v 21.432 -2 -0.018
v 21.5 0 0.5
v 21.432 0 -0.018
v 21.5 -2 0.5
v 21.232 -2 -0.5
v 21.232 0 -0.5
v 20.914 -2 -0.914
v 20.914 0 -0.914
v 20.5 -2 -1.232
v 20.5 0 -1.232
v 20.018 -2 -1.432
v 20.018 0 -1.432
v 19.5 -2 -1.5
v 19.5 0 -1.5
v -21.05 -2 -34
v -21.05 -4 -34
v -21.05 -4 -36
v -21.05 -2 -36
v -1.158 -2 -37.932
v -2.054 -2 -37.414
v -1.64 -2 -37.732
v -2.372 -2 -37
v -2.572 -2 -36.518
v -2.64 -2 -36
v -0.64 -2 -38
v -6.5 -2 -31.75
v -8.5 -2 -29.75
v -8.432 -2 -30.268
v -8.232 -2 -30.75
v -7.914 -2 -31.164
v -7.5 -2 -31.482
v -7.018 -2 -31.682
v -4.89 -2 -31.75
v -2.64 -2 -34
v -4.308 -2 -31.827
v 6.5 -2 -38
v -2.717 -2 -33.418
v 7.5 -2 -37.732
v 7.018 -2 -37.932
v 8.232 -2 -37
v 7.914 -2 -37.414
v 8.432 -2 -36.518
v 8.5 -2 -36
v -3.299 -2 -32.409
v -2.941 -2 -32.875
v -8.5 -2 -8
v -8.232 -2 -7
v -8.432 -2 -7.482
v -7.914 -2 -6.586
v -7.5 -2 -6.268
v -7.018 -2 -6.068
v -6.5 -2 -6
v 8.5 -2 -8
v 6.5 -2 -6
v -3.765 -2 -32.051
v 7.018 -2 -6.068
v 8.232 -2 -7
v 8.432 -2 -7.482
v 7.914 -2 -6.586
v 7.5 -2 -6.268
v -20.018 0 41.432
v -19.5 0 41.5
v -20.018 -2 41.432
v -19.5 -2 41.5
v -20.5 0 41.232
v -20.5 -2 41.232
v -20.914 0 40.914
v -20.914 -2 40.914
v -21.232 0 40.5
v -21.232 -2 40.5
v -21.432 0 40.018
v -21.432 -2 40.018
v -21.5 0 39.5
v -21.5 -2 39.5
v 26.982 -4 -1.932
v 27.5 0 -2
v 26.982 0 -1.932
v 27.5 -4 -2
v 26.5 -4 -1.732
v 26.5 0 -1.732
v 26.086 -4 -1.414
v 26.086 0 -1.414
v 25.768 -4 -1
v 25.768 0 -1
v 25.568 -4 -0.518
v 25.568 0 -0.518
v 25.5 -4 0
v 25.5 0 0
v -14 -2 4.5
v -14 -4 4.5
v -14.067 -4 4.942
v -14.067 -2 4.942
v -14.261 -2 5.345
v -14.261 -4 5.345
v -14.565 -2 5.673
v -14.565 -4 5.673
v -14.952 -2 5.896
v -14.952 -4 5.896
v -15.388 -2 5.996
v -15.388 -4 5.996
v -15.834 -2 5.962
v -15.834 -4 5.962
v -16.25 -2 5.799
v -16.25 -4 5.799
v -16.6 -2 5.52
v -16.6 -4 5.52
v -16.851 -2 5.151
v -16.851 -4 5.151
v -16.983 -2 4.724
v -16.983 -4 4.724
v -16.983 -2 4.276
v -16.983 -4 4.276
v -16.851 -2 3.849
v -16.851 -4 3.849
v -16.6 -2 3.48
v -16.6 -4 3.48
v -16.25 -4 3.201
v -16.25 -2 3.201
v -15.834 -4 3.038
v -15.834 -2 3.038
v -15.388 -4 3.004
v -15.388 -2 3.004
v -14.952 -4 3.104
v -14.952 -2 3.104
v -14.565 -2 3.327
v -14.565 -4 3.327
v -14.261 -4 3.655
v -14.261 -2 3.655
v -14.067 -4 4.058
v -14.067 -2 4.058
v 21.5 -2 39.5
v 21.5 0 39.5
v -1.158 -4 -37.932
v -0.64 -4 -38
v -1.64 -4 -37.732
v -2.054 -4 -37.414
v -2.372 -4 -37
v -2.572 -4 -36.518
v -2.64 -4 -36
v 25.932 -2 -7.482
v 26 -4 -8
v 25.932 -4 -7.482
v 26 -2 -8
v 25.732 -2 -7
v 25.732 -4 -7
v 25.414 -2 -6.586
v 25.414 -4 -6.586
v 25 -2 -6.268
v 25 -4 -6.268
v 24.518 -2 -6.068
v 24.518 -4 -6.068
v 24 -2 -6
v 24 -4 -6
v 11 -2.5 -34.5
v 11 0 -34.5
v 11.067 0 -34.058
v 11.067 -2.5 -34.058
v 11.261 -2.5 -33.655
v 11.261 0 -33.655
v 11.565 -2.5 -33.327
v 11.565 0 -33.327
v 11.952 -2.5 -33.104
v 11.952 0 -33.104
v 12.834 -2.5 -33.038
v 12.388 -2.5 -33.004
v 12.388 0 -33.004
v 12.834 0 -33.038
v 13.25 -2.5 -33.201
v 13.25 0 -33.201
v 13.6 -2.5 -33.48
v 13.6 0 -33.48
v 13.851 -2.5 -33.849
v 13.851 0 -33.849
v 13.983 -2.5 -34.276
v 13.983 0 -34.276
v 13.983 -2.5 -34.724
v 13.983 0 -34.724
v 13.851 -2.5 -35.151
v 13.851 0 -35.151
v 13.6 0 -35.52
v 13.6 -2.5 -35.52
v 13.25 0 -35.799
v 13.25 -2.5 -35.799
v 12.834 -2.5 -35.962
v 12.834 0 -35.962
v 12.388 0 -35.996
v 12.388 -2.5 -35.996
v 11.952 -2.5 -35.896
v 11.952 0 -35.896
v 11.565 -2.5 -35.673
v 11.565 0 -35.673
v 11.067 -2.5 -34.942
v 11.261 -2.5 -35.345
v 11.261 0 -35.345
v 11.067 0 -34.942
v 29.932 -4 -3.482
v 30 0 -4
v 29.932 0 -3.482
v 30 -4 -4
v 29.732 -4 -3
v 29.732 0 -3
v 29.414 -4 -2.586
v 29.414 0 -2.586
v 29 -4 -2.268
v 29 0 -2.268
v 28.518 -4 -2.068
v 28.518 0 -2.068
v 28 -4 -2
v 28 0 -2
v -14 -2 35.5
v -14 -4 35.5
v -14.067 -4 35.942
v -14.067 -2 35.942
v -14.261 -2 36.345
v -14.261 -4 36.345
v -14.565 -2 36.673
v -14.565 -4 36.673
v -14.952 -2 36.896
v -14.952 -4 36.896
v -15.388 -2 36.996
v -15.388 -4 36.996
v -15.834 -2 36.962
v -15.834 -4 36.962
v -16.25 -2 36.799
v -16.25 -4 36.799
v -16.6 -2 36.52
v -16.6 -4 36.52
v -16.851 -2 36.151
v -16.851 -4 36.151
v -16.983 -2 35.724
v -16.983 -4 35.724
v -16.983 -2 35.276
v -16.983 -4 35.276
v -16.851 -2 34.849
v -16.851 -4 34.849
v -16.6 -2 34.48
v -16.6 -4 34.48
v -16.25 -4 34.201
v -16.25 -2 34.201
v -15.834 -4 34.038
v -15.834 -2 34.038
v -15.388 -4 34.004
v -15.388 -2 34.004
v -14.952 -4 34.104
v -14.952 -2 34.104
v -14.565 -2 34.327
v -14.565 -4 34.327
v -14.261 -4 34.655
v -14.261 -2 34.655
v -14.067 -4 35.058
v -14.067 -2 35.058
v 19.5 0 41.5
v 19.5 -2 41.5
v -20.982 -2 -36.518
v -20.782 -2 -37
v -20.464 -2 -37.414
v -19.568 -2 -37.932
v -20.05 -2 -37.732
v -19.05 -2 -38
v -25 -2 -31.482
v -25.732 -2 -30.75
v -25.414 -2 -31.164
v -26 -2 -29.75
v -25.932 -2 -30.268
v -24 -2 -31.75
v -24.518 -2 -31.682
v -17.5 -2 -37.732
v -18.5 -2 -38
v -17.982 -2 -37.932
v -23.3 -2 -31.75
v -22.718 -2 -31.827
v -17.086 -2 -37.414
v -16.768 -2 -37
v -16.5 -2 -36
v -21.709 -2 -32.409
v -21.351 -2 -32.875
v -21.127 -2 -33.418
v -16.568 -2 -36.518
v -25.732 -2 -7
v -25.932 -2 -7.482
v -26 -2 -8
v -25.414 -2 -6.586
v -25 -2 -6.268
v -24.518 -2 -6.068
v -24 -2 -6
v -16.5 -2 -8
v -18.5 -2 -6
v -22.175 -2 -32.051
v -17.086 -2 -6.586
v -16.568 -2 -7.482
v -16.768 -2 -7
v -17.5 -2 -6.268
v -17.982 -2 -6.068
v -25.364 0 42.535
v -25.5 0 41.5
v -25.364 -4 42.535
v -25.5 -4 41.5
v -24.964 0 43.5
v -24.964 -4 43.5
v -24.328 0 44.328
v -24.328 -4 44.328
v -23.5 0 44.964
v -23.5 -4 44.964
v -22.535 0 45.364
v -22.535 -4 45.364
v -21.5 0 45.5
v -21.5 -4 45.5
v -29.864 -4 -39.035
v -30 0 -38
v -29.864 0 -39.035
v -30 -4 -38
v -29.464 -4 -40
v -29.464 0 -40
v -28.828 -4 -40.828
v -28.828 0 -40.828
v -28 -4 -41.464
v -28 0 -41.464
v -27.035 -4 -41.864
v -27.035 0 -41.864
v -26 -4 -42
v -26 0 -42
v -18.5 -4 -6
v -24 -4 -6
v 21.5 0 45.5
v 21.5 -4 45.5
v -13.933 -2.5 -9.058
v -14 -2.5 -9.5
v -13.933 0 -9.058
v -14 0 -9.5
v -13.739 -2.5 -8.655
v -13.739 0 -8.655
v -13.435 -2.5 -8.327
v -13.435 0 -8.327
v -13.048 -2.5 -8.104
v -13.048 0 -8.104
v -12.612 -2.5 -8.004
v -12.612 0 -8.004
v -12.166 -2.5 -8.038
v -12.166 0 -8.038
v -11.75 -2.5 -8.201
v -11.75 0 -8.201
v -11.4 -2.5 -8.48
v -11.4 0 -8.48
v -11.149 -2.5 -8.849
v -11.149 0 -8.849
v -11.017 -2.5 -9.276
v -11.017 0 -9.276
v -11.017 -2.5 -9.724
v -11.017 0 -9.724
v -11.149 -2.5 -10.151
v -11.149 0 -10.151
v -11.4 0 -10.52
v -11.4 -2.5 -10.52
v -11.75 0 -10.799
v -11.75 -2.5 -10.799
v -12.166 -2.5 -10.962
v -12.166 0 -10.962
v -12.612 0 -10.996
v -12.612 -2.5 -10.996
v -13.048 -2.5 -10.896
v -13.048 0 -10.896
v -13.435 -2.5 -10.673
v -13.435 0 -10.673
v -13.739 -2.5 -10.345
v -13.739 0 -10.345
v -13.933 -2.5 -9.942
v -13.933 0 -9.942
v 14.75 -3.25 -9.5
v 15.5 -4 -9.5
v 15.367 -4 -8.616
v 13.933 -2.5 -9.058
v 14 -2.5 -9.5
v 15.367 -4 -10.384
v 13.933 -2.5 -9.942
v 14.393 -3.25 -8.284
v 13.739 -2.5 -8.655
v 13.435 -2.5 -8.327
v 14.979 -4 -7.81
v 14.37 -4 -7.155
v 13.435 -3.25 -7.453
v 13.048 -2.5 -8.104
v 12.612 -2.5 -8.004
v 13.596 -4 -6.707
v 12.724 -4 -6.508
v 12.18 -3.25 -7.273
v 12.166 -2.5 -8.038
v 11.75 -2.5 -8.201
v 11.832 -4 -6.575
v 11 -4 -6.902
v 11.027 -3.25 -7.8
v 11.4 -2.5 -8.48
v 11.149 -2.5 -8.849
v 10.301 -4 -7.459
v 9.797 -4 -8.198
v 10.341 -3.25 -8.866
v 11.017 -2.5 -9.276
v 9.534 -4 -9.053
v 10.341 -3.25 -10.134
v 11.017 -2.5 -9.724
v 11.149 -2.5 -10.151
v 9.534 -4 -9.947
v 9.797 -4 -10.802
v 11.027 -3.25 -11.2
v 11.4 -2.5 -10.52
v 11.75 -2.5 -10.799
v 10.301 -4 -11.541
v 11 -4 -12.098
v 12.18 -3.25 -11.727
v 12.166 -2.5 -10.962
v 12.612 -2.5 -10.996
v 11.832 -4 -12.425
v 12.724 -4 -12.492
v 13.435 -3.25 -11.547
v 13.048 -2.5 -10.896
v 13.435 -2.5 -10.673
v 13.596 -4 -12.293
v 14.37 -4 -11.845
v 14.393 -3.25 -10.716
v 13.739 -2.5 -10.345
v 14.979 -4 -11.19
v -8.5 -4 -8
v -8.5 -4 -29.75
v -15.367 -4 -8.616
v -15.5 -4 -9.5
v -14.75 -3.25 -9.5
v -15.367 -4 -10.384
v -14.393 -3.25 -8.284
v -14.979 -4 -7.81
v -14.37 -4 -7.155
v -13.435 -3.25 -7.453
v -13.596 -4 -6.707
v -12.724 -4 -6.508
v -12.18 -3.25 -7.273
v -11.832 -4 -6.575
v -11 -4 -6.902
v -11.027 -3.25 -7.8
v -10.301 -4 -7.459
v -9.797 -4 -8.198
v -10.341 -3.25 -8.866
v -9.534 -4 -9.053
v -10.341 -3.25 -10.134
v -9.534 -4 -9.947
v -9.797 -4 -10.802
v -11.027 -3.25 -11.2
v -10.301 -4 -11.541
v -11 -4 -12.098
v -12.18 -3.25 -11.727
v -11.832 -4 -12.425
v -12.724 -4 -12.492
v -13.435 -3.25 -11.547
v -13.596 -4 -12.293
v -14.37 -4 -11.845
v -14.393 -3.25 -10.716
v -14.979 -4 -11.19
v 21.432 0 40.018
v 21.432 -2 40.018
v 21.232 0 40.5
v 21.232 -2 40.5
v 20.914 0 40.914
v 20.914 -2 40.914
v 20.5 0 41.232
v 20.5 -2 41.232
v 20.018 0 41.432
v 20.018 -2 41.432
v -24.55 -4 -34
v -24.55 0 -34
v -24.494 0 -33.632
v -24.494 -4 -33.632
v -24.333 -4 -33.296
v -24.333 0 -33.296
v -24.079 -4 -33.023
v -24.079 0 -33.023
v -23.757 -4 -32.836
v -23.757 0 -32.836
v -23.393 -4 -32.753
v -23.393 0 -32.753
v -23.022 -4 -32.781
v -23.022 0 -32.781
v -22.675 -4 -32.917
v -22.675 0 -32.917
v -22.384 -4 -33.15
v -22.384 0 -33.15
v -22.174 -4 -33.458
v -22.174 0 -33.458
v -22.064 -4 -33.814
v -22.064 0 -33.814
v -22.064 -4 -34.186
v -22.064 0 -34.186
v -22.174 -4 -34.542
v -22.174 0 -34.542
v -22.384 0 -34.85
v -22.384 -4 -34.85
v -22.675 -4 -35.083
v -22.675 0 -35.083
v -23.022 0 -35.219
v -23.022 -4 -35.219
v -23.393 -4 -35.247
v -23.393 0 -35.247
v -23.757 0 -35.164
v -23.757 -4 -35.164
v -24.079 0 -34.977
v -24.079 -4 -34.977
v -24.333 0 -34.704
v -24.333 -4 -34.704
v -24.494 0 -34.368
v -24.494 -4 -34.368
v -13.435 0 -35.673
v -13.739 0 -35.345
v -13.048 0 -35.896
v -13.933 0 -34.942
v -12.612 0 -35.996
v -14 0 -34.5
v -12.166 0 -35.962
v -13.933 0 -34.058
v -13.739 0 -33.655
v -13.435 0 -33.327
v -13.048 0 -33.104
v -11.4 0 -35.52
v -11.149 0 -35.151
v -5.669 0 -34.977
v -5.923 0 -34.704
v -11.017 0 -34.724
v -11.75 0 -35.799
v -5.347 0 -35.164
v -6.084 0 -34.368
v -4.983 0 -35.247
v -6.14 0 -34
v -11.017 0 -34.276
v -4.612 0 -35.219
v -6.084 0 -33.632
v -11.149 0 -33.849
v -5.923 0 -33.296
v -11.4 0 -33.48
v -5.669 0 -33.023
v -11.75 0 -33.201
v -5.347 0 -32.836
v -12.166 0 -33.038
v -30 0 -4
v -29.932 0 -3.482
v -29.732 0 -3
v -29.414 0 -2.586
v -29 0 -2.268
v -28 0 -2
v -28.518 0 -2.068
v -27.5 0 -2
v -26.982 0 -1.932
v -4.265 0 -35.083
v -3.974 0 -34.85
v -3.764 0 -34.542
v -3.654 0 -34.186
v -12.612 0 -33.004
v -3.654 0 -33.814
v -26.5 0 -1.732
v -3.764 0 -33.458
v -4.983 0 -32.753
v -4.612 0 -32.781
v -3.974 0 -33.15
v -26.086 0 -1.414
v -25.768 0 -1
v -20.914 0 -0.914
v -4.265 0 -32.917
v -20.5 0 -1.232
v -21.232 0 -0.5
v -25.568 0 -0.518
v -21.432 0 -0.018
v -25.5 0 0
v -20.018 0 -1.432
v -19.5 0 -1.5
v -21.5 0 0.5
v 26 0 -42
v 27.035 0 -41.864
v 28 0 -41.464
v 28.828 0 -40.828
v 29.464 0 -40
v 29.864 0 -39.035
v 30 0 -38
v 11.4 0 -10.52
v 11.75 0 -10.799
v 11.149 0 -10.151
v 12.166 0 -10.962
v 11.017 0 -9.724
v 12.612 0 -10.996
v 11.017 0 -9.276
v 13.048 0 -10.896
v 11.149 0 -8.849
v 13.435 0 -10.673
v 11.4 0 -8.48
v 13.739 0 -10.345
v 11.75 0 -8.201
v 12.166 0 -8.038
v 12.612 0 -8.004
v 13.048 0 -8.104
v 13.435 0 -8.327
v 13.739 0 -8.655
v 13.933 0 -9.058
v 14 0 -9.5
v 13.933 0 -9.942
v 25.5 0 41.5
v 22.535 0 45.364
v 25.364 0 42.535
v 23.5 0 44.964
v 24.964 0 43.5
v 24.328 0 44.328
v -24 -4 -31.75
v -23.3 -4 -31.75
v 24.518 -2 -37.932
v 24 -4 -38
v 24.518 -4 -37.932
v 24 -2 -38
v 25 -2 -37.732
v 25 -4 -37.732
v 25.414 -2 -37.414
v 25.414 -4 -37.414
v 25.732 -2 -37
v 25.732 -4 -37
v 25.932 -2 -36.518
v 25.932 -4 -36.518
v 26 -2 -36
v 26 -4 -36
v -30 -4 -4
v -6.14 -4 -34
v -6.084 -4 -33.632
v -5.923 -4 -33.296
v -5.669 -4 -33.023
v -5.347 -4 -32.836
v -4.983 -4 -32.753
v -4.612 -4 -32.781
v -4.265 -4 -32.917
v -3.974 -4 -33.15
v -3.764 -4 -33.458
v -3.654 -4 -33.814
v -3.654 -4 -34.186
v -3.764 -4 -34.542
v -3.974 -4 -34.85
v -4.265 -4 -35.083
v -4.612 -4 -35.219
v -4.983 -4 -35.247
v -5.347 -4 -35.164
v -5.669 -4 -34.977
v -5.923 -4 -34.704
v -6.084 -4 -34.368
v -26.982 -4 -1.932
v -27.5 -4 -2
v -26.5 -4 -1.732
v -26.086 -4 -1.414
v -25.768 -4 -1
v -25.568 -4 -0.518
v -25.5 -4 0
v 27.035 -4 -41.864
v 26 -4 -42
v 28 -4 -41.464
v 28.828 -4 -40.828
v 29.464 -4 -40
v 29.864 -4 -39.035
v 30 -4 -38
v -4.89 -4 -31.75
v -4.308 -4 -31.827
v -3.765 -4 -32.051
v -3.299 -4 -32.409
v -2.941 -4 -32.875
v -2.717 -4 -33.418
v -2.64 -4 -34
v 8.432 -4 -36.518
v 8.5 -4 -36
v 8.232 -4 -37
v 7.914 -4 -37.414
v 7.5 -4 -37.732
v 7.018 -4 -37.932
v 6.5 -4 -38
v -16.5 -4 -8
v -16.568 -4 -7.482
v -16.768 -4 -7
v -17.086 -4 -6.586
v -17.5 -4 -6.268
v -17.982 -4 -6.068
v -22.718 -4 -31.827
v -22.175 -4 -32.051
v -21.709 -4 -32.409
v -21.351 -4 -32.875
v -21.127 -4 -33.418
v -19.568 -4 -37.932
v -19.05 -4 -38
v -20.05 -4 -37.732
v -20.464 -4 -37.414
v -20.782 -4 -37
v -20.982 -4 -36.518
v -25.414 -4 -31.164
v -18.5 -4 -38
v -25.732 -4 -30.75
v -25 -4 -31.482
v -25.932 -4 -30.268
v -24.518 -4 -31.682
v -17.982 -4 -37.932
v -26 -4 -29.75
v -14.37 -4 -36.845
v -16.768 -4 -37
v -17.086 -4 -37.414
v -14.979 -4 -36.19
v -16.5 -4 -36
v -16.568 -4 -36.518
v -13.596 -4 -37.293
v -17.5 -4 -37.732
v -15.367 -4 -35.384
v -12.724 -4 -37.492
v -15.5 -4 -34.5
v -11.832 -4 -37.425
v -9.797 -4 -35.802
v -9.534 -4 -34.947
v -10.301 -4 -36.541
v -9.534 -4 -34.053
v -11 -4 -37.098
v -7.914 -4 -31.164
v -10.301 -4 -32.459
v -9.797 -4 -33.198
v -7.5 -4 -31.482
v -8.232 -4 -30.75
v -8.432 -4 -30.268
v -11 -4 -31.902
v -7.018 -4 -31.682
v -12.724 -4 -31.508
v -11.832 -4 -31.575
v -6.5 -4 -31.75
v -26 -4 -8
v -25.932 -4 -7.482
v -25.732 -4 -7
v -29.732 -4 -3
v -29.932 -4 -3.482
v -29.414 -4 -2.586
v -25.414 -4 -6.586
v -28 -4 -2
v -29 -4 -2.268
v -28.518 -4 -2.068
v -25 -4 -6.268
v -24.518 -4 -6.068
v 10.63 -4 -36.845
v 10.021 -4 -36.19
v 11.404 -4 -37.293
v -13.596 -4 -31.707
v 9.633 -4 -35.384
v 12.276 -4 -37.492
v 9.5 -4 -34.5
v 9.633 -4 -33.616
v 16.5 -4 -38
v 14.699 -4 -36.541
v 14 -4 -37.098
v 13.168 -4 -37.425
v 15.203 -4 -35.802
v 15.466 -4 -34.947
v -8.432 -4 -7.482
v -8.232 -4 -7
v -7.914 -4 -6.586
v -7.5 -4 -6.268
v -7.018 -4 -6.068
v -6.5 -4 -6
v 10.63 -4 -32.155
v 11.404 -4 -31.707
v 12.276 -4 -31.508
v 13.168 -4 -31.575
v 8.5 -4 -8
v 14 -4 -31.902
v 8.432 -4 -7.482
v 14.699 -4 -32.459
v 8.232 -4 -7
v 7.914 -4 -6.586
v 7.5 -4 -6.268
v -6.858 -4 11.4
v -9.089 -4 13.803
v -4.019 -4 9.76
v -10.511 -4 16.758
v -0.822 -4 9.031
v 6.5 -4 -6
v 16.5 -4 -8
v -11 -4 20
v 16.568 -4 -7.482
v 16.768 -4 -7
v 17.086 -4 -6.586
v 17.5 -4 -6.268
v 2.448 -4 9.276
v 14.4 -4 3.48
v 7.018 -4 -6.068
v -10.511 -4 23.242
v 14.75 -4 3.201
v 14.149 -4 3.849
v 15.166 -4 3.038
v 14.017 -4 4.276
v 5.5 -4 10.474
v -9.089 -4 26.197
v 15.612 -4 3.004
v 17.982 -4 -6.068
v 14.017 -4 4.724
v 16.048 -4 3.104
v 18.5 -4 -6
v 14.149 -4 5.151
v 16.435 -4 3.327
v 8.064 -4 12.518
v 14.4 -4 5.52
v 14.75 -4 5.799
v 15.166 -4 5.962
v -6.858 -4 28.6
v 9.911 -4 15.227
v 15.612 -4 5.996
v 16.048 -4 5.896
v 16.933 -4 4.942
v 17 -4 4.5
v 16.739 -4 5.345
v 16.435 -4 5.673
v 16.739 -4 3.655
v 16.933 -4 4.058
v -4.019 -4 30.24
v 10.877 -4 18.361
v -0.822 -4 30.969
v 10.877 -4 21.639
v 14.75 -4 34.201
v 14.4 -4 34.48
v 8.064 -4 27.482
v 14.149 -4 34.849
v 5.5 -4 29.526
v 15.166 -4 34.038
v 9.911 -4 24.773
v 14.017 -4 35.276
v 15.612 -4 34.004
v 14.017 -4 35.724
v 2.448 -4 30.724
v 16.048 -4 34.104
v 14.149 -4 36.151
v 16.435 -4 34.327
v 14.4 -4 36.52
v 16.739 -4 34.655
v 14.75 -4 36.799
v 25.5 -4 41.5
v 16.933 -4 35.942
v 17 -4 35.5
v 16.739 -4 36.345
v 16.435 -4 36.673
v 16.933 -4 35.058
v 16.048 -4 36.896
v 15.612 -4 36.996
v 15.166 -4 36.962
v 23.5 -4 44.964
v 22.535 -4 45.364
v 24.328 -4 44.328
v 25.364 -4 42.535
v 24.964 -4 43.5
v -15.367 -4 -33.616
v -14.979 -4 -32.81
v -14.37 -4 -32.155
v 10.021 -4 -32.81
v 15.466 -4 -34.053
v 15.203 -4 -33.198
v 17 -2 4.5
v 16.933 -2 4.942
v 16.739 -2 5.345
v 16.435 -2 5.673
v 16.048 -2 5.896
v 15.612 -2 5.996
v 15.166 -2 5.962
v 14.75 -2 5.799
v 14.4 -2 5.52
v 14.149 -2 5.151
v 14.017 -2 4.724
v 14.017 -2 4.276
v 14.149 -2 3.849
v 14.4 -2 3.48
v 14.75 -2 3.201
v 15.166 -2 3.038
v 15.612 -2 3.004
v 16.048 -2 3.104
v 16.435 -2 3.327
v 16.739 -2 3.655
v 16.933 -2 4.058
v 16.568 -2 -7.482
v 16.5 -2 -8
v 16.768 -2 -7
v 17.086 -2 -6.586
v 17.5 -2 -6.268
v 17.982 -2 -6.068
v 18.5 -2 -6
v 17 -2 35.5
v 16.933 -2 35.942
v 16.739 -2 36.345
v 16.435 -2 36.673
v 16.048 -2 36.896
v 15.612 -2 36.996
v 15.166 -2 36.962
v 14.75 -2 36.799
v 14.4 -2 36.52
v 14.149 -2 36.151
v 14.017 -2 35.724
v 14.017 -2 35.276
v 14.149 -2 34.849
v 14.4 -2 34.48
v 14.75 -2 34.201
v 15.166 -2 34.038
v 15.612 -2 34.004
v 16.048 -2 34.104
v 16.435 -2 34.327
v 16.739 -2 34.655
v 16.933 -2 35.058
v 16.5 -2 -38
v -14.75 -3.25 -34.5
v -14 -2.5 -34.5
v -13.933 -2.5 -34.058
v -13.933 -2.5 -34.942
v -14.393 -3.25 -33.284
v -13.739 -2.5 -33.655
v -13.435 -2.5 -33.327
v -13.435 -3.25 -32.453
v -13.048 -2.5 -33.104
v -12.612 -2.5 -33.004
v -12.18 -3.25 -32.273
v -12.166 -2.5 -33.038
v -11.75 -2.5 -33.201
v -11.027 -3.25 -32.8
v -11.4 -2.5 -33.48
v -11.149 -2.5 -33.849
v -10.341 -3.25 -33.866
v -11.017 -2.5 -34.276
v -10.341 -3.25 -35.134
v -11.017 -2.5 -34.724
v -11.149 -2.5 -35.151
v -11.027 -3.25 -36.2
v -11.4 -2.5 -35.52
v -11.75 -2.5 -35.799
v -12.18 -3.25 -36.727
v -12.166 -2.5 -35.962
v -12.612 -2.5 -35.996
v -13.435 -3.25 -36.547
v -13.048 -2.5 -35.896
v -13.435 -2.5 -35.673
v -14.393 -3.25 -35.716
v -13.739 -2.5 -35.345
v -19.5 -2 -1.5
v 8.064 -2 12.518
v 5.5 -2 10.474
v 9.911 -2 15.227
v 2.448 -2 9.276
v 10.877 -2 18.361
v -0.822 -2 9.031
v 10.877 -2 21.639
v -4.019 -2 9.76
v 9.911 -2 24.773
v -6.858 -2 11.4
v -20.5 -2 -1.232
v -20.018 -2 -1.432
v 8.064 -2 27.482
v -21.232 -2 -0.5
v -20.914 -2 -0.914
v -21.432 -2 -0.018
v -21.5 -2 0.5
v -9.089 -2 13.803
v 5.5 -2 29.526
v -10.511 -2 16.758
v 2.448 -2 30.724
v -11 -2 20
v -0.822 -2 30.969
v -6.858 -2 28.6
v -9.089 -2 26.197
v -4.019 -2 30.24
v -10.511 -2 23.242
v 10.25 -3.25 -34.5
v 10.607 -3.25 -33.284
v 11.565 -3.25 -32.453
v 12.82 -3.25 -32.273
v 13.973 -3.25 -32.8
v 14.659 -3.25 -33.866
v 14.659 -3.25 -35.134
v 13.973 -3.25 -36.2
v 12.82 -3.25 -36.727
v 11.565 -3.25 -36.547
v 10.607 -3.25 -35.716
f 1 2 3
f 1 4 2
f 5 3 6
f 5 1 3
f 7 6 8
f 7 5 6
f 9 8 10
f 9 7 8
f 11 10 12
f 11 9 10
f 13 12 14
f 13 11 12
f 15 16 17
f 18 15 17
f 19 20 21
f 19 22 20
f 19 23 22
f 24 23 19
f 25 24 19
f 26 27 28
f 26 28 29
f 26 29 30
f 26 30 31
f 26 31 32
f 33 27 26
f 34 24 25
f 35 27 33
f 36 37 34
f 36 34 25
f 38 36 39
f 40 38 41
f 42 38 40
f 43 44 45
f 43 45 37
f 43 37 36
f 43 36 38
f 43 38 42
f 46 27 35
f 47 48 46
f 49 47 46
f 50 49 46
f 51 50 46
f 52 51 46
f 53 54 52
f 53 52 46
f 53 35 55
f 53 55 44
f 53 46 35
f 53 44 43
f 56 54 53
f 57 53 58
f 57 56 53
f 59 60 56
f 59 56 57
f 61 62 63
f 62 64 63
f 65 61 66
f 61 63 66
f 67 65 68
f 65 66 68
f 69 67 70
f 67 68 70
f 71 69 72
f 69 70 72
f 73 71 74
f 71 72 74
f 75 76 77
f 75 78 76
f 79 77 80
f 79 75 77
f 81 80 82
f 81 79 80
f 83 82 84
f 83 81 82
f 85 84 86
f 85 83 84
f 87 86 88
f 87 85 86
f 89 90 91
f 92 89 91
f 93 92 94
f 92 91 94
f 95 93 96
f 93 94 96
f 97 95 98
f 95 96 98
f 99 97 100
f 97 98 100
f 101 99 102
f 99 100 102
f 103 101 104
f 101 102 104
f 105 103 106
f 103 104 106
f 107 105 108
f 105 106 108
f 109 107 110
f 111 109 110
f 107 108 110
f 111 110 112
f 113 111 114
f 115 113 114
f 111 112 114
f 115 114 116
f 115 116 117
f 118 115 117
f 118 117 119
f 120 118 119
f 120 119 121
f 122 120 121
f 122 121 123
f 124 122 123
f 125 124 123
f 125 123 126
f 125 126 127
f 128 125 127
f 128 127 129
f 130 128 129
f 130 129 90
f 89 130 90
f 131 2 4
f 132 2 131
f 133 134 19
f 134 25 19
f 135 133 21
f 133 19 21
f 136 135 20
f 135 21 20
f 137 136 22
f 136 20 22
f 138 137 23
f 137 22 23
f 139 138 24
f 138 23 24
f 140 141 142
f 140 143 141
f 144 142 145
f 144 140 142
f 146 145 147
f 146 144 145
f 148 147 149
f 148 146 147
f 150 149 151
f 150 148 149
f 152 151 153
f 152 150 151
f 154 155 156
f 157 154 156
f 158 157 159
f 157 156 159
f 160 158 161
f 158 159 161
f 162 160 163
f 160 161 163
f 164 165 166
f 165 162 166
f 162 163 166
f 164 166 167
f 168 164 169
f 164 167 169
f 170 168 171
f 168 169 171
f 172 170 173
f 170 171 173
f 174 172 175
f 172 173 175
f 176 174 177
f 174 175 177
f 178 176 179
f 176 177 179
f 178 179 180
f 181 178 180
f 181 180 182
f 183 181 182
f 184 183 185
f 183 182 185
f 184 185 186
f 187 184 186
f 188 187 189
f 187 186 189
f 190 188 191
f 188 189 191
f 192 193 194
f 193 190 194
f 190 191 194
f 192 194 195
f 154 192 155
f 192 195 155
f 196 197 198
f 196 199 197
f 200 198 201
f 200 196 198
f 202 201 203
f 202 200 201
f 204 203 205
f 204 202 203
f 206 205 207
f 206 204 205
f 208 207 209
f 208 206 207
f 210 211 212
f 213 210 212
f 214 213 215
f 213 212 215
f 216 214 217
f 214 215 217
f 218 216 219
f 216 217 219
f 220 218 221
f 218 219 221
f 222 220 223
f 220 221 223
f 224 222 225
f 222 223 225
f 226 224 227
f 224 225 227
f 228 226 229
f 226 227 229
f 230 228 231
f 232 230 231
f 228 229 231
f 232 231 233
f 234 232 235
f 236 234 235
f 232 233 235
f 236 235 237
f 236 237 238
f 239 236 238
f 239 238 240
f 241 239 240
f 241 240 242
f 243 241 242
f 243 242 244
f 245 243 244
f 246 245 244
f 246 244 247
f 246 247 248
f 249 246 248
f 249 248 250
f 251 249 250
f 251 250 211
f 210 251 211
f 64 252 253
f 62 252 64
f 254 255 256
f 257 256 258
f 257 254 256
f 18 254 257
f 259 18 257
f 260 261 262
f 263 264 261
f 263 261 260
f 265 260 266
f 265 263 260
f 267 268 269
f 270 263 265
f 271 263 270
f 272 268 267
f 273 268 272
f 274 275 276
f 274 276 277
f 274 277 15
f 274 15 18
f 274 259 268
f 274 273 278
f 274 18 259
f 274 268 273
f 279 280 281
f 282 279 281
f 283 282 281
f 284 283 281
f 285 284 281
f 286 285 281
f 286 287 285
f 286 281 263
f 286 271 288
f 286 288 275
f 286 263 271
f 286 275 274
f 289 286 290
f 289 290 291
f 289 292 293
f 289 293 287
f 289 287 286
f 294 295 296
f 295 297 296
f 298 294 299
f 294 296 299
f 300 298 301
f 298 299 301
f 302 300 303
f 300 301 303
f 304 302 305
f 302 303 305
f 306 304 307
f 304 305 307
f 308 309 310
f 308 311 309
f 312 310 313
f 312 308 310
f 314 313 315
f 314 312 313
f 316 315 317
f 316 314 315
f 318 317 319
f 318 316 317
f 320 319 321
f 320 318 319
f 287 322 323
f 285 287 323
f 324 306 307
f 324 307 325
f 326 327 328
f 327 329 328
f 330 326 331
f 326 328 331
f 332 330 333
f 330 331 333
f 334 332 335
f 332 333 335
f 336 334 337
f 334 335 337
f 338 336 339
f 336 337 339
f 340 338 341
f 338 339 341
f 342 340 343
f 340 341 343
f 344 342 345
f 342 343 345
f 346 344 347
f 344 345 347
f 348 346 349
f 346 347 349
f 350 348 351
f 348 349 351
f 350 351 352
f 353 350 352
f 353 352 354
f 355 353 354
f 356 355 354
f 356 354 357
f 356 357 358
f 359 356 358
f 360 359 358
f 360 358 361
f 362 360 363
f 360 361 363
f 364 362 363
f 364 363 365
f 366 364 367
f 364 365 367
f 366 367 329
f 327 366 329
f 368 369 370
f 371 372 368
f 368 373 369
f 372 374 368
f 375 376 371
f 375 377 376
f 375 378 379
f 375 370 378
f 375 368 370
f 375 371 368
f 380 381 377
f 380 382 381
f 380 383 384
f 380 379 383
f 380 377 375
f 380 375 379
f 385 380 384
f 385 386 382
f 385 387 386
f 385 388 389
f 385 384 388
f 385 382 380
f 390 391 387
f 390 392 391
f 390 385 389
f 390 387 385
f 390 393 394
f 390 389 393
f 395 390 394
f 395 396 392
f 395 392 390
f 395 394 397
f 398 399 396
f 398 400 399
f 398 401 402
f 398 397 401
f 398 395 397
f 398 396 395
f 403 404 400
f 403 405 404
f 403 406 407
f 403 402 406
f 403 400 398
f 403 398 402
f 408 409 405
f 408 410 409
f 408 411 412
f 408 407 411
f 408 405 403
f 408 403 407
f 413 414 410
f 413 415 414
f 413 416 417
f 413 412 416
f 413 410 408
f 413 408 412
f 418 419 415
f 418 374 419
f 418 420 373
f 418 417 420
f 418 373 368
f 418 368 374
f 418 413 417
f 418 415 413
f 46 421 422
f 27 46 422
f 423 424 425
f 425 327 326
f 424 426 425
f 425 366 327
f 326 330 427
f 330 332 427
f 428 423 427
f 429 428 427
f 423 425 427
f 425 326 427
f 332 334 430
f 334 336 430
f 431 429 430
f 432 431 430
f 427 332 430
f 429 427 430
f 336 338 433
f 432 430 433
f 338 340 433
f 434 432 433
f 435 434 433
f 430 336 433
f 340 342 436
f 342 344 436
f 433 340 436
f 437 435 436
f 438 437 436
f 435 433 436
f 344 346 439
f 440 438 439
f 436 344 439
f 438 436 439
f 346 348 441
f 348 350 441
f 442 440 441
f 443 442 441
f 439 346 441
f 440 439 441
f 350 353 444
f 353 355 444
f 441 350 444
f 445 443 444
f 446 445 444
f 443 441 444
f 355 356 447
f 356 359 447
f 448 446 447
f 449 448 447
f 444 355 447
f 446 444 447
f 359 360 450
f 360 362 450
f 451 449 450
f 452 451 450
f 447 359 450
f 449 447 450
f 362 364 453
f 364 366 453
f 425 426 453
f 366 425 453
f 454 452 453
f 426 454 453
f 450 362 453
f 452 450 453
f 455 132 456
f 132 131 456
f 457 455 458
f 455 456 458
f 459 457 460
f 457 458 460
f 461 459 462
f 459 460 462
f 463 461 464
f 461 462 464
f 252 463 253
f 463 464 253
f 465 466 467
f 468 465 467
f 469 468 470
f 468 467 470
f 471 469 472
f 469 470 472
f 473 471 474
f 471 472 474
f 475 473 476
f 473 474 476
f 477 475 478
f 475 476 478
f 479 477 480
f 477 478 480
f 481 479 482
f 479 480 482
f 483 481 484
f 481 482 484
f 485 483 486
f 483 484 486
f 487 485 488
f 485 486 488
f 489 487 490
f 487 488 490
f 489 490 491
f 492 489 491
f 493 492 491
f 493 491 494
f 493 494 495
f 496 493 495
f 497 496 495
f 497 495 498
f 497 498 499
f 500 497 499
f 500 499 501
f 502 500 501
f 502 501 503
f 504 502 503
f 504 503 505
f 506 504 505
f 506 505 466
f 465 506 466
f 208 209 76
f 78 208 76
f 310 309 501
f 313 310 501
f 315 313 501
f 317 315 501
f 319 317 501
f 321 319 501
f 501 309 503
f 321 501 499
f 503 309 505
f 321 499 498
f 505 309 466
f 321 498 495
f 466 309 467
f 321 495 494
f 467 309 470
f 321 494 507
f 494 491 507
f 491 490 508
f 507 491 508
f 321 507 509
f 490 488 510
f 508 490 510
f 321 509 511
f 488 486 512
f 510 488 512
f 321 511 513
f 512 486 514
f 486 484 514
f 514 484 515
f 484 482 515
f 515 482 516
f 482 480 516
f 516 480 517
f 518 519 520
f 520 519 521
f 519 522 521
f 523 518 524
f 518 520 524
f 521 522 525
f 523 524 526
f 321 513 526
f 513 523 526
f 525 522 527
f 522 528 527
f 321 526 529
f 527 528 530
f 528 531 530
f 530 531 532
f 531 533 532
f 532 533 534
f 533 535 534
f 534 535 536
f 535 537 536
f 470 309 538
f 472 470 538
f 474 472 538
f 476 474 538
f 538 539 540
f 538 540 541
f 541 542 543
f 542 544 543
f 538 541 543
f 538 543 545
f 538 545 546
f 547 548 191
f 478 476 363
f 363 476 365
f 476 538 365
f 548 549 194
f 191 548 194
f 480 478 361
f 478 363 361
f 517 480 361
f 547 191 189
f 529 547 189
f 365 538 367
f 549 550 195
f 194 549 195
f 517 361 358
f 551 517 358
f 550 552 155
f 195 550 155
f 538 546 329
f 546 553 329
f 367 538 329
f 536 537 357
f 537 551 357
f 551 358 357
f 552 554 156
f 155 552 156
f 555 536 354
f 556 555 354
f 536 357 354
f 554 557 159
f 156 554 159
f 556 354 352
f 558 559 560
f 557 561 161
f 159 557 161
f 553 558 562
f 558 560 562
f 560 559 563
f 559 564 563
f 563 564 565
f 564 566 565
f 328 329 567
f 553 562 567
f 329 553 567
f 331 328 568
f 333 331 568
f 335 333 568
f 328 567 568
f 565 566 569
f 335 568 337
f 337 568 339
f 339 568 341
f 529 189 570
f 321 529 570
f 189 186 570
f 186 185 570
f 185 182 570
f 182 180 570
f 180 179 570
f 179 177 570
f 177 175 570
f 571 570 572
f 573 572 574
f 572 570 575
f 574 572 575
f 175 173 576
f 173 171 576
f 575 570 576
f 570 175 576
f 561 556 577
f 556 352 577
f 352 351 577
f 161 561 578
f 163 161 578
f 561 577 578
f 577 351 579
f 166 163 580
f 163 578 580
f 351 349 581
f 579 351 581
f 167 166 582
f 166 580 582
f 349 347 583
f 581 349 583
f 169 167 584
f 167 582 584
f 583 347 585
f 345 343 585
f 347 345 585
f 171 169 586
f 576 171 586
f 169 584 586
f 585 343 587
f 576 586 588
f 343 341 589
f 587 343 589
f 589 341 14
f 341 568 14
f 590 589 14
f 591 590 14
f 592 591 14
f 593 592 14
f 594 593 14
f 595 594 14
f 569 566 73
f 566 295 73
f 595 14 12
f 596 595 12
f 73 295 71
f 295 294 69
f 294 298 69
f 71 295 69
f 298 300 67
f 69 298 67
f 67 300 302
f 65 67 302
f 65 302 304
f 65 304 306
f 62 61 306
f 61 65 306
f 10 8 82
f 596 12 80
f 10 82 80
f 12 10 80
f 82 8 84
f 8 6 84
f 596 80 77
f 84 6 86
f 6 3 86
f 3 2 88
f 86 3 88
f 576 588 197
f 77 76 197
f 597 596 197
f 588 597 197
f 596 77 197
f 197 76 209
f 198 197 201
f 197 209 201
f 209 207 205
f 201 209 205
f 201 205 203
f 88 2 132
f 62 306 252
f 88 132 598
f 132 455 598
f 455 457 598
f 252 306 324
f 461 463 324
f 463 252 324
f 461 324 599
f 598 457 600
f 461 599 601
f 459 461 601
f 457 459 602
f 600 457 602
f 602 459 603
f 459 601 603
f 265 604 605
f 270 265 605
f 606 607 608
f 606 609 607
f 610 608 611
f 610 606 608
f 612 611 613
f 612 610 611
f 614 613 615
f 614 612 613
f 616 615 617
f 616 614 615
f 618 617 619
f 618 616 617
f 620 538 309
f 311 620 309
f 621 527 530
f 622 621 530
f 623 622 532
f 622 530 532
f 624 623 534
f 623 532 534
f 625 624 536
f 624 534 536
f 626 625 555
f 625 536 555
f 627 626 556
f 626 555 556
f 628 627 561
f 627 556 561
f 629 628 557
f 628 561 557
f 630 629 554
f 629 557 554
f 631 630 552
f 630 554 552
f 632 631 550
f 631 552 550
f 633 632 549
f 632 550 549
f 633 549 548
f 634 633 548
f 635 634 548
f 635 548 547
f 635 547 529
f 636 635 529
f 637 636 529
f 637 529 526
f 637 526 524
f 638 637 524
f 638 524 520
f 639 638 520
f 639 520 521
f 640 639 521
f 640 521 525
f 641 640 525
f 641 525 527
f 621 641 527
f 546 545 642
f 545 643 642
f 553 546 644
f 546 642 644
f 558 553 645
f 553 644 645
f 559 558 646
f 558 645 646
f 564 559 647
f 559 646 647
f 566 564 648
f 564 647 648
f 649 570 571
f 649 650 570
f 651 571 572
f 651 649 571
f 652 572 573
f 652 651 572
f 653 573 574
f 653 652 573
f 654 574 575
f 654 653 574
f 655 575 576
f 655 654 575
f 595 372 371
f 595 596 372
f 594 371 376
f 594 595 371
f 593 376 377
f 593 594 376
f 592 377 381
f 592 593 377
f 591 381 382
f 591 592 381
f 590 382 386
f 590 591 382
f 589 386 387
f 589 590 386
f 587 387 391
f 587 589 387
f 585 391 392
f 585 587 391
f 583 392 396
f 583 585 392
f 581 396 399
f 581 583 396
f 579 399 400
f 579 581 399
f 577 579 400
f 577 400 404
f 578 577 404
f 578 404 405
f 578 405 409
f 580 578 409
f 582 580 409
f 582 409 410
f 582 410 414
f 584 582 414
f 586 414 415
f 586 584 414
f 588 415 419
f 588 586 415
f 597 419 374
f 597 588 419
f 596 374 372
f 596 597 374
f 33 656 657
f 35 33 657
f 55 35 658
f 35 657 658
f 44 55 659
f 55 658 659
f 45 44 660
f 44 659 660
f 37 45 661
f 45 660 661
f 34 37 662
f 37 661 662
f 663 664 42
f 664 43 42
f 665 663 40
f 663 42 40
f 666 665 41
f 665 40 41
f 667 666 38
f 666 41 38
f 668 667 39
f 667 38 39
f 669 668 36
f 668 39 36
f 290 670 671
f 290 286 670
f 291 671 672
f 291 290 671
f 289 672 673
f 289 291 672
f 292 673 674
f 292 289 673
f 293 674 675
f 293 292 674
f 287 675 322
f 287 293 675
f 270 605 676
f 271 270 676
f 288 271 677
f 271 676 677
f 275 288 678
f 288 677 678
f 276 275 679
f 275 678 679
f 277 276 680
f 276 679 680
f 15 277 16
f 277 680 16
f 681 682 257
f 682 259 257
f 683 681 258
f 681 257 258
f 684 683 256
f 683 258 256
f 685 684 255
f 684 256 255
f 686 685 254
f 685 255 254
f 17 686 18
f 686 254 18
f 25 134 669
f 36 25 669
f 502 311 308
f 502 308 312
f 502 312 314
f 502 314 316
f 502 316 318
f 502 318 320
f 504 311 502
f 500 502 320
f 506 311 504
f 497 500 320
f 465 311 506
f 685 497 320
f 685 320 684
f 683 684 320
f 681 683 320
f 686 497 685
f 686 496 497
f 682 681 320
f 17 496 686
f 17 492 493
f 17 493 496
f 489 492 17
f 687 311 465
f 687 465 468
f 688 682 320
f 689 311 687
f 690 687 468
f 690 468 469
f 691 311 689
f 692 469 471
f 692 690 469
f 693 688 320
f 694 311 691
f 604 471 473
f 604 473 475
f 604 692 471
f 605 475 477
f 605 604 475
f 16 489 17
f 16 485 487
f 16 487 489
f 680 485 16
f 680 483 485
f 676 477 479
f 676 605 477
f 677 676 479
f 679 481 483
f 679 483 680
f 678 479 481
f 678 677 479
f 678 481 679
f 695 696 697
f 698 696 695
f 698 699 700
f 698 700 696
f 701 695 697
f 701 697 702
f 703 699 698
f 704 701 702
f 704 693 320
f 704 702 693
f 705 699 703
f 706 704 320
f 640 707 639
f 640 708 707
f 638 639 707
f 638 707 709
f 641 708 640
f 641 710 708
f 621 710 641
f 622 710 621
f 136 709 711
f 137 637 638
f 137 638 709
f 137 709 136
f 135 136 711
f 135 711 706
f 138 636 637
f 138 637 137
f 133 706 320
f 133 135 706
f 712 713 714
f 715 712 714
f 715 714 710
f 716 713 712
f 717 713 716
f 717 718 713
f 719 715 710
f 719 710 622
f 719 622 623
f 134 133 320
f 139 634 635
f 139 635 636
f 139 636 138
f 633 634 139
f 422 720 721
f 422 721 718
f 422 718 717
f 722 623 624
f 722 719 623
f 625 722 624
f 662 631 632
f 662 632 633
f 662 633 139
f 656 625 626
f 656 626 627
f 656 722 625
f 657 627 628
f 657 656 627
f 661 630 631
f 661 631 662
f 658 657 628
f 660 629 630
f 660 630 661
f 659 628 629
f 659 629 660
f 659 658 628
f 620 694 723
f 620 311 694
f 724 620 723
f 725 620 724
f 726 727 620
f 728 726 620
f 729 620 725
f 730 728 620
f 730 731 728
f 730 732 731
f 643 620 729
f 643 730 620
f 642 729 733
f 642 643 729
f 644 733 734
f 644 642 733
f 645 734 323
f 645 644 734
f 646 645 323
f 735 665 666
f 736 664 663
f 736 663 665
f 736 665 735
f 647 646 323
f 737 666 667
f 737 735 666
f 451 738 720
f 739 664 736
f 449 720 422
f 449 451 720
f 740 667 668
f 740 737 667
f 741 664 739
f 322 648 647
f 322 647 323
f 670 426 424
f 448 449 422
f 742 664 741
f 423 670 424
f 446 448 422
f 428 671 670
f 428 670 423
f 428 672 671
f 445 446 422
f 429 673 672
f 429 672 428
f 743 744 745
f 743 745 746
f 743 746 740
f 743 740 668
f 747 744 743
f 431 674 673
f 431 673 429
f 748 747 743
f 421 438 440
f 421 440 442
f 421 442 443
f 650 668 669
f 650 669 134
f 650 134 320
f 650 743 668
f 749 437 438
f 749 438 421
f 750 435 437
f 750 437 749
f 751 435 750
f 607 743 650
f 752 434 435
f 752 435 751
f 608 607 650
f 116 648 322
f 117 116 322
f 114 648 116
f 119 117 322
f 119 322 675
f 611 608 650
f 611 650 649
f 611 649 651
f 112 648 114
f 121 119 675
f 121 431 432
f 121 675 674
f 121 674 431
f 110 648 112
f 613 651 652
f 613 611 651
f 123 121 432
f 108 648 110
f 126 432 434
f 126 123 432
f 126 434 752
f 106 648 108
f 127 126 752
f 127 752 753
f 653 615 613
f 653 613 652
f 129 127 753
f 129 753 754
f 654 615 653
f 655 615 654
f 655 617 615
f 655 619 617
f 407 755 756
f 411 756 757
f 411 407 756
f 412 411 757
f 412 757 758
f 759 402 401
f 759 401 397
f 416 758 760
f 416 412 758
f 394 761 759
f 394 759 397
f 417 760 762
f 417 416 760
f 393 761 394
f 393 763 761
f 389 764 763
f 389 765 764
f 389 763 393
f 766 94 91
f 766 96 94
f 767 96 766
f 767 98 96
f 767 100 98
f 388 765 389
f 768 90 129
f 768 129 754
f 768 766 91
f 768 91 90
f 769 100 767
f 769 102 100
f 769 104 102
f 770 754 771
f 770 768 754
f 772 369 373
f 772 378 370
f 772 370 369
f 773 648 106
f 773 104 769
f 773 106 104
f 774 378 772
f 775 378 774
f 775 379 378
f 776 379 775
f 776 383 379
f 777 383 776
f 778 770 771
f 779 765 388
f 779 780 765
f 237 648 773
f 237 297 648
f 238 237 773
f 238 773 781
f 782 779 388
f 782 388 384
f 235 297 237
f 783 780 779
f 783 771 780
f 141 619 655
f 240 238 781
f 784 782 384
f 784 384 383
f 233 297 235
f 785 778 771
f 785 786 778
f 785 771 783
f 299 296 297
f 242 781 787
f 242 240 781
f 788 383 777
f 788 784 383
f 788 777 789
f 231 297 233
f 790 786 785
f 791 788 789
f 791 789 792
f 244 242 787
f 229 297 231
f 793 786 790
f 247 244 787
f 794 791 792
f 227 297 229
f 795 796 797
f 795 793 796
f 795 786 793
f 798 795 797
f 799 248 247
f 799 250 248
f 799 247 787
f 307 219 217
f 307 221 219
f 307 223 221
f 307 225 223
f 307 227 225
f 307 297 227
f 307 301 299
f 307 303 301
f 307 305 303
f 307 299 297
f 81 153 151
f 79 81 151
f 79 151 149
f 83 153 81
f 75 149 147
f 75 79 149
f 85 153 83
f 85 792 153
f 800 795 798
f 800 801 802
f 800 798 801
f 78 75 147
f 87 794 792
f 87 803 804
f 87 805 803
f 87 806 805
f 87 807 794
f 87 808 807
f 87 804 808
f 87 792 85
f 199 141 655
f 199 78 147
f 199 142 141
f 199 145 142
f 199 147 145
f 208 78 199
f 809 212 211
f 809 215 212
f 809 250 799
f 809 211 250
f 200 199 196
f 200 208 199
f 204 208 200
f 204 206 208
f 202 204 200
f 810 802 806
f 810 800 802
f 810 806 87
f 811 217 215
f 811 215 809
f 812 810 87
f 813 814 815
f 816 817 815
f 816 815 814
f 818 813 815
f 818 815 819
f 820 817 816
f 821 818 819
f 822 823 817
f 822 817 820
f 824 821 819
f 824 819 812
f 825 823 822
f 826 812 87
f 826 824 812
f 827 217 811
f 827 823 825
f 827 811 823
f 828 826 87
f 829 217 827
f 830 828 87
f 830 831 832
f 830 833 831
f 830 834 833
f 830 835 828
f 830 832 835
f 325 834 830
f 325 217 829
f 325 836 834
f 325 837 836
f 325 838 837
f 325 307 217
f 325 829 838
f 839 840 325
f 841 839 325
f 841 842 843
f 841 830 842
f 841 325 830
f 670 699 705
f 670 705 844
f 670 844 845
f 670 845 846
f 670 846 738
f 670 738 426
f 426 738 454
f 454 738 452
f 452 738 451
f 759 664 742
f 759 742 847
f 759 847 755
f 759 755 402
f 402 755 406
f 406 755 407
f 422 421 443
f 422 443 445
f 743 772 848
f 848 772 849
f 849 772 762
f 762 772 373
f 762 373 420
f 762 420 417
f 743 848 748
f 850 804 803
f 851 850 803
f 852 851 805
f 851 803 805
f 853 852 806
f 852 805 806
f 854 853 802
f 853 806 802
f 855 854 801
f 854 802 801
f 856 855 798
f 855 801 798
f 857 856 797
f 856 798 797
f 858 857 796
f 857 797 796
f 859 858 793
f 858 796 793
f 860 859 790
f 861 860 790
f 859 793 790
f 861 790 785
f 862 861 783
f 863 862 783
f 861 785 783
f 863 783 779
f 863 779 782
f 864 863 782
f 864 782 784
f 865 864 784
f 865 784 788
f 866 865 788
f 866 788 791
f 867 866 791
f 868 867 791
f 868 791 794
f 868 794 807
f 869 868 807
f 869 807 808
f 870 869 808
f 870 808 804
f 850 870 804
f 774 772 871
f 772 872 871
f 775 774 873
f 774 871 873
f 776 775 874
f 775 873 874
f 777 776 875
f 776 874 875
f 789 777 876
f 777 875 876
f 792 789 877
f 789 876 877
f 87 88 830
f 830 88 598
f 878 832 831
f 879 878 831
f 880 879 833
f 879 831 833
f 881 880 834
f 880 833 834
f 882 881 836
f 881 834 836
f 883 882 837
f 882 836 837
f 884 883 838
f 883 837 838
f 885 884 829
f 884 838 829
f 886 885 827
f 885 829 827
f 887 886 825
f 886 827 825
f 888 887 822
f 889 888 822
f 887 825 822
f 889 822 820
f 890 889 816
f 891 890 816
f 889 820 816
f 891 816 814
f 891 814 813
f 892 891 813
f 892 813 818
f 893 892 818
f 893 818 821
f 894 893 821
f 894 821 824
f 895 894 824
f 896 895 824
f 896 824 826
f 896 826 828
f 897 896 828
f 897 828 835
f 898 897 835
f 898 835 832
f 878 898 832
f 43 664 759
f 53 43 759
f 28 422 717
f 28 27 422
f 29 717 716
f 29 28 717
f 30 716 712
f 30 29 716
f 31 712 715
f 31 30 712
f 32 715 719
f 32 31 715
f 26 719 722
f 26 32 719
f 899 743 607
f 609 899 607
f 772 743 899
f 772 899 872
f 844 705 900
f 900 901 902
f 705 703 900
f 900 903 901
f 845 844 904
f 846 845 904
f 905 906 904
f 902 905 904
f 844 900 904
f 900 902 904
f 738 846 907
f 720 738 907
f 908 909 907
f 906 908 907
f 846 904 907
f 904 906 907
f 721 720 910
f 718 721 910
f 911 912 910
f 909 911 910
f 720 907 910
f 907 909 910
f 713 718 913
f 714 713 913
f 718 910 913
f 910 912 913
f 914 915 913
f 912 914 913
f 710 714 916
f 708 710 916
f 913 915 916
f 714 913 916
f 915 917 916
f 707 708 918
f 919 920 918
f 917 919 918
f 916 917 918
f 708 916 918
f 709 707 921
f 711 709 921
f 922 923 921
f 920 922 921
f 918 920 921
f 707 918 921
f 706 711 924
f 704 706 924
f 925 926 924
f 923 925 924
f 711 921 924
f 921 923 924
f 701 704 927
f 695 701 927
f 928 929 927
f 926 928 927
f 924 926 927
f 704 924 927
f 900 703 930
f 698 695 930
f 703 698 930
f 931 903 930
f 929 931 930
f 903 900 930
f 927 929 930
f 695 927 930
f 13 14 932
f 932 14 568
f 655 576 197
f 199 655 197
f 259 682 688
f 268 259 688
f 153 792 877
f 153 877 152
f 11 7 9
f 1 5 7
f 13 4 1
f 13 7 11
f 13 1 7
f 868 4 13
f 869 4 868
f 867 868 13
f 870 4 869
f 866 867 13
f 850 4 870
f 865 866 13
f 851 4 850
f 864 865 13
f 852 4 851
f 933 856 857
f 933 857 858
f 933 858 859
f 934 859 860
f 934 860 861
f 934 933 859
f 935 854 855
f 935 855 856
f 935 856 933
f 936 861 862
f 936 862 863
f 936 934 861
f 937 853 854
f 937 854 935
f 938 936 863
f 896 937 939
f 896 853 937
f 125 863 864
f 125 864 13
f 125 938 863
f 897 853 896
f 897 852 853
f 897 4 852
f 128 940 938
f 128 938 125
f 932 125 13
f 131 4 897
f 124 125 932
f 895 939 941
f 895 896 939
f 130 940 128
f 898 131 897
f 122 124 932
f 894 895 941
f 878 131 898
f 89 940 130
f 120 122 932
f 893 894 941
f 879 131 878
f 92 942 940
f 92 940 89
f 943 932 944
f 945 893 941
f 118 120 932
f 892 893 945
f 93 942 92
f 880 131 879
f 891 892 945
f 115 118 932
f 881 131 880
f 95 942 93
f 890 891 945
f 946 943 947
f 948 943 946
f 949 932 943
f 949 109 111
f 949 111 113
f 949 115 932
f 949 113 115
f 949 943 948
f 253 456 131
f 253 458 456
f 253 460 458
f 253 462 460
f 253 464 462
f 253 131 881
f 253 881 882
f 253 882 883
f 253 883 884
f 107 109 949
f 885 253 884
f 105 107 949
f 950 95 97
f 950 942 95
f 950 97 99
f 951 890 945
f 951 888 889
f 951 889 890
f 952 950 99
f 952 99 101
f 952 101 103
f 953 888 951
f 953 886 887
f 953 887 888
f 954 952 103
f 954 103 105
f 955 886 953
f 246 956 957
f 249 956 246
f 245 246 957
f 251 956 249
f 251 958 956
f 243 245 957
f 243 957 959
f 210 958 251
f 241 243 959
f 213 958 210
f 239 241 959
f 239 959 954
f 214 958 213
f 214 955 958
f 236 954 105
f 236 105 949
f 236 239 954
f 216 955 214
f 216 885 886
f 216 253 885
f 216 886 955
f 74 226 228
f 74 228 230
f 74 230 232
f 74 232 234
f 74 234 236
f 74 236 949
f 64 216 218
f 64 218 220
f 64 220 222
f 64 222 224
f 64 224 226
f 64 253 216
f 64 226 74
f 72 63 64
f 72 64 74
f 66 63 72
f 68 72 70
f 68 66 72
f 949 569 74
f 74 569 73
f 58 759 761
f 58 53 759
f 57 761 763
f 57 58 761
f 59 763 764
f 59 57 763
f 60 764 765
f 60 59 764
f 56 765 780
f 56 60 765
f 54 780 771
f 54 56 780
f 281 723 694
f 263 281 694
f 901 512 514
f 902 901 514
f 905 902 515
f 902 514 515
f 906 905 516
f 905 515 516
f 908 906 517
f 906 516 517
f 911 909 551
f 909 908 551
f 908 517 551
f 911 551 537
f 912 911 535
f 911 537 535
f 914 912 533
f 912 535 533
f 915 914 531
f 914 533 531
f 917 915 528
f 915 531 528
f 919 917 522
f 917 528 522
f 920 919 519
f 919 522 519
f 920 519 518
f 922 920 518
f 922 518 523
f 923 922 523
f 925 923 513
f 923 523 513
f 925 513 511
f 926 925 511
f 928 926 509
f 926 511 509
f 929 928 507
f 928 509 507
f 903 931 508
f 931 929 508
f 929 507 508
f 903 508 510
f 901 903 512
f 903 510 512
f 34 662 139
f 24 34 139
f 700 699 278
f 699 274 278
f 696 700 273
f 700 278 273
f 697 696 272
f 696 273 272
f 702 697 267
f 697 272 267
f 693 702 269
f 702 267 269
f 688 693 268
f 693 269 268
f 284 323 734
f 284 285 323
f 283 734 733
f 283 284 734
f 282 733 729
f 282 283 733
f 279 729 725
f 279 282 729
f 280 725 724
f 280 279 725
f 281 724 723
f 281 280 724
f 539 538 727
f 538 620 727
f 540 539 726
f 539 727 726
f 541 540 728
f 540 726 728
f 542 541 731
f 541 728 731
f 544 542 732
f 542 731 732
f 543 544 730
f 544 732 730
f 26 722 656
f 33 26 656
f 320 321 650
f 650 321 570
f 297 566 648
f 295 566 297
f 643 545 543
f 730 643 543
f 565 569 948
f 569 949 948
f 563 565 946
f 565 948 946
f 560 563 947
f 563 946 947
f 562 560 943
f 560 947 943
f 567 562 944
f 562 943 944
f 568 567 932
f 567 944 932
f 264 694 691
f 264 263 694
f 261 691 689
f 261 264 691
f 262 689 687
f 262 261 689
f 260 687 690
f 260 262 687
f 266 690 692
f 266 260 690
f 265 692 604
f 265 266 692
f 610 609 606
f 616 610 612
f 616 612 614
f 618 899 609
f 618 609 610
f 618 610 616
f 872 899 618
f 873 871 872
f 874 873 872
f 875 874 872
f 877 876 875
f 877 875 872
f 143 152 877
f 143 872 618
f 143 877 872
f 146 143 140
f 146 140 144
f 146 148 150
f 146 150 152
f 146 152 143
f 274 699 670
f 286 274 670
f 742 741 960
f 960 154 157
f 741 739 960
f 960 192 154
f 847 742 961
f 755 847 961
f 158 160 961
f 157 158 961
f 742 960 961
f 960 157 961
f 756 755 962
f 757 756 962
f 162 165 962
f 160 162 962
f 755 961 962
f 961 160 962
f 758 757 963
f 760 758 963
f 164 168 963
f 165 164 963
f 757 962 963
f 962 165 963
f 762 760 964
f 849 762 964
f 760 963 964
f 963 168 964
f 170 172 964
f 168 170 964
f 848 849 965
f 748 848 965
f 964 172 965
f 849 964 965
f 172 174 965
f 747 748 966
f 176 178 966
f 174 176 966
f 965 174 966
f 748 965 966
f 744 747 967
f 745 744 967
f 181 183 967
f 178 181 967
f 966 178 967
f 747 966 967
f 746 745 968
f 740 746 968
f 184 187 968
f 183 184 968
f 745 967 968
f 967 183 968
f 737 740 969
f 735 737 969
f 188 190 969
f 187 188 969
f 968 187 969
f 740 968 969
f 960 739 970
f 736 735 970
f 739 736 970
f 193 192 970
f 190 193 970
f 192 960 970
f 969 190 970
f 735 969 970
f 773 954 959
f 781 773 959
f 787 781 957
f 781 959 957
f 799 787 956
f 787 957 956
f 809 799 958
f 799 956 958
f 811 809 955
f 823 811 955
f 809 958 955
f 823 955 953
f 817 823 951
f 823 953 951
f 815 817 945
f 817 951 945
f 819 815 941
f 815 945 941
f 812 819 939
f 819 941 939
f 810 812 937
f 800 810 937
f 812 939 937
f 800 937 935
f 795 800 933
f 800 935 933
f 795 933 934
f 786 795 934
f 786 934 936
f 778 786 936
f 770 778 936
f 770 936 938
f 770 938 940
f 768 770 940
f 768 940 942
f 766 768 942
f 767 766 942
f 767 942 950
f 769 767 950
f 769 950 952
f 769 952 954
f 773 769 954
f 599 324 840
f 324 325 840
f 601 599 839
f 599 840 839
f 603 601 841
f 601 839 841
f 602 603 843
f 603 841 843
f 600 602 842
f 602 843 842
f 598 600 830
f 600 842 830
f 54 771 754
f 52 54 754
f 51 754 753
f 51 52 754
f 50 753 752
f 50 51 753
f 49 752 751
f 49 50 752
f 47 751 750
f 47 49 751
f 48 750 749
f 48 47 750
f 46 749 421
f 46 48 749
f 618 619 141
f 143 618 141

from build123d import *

# Parameters (mm, degrees)
F0_W           = 51
F0_H           = 47.5
F1_DEPTH       = 4
F2_W           = 43
F2_H           = 43
F2_R           = 11
F3_DEPTH       = 2
F4_DEPTH       = 4.001
F5_D           = 3
F6_R           = 2
F7_W           = 9.5
F7_H           = 32
F8_DEPTH       = 2
F9_D           = 3
F9_CSINK_D     = 6
F9_CSINK_ANGLE = 90
F10_D          = 2.5
F11_R          = 2
F13_R          = 4


# Not quite as in the source:
# - two fillets or chamfers of one size are made in one step
# - a pattern or mirror of a feature is missing from the dataset's text; its kind, count and spacing are read off the source's solid


with BuildPart() as f1:
    # F0 (on Front) → F1 (new body)
    with BuildSketch(Plane.XZ):
        Polygon((25.5, -2), (-25.5, -2), (-30, -2), (-30, -42), (30, -42), (30, -2), align=None)
        with Locations((0, 21.75)):
            Rectangle(F0_W, F0_H)
    extrude(amount=F1_DEPTH)

    # F2 (on face) → F3 (cut)
    with BuildSketch(Plane(origin=(0, 0, 0), x_dir=(-1, 0, 0), z_dir=(0, 1, 0))):
        with Locations((0, 20)):
            Rectangle(F2_W, F2_H)
        with Locations((0, 20)):
            Circle(F2_R, mode=Mode.SUBTRACT)
    extrude(amount=-F3_DEPTH, mode=Mode.SUBTRACT)

    # F2 (on face) → F4 (cut, through all)
    with BuildSketch(Plane(origin=(0, 0, 0), x_dir=(-1, 0, 0), z_dir=(0, 1, 0))):
        with Locations((0, 20)):
            Circle(F2_R)
    extrude(amount=-F4_DEPTH, mode=Mode.SUBTRACT)

    # F5 (through all)
    with Locations(Plane(origin=(0, 0, 0), x_dir=(-1, 0, 0), z_dir=(0, 1, 0))):
        with Locations((-15.5, 35.5), (15.5, 35.5), (15.5, 4.5), (-15.5, 4.5)):
            Hole(F5_D / 2)

    # F6
    f6_edges = [f1.edges().sort_by_distance(p)[0] for p in [
        (21.5, -1, 41.5),
        (-21.5, -1, 41.5),
        (-21.5, -1, -1.5),
        (21.5, -1, -1.5),
    ]]
    fillet(f6_edges, radius=F6_R)

    # F7 (on face) → F8 (cut)
    with BuildSketch(Plane.XZ.offset(4)):
        with BuildLine():
            Line((-16.5, -38), (-16.5, -6))
            Line((-16.5, -6), (-26, -6))
            Line((-26, -6), (-26, -31.75))
            Line((-26, -31.75), (-23.3, -31.75))
            ThreePointArc((-23.3, -31.75), (-21.7090097423, -32.4090097423), (-21.05, -34))
            Line((-21.05, -34), (-21.05, -38))
            Line((-21.05, -38), (-16.5, -38))
        make_face()
        with BuildLine():
            Line((8.5, -38), (8.5, -6))
            Line((8.5, -6), (-8.5, -6))
            Line((-8.5, -6), (-8.5, -31.75))
            Line((-8.5, -31.75), (-4.89, -31.75))
            ThreePointArc((-4.89, -31.75), (-3.2990097423, -32.4090097423), (-2.64, -34))
            Line((-2.64, -34), (-2.64, -38))
            Line((-2.64, -38), (8.5, -38))
        make_face()
        with Locations((21.25, -22)):
            Rectangle(F7_W, F7_H)
    extrude(amount=-F8_DEPTH, mode=Mode.SUBTRACT)

    # F9 (through all)
    with Locations(Plane.XZ.offset(4)):
        with Locations((-12.5, -9.5), (-12.5, -9.5), (-12.5, -34.5), (12.5, -34.5)):
            f9 = CounterSinkHole(F9_D / 2, F9_CSINK_D / 2, counter_sink_angle=F9_CSINK_ANGLE)

    # F9_copies: F9 across plane
    add(f9.mirror(Plane(origin=(0, 0, 0), x_dir=(0, 0, 1), z_dir=(1, 0, 0))), mode=Mode.SUBTRACT)

    # F10 (through all)
    with Locations(Plane.XZ.offset(4)):
        with Locations((-23.3, -34), (-4.89, -34)):
            Hole(F10_D / 2)

    # F11
    f11_edges = [f1.edges().sort_by_distance(p)[0] for p in [
        (-26, -3, -6),
        (26, -3, -6),
        (26, -3, -38),
        (-16.5, -3, -38),
        (8.5, -3, -38),
        (-16.5, -3, -6),
        (8.5, -3, -6),
        (-8.5, -3, -6),
        (16.5, -3, -6),
        (-8.5, -3, -31.75),
        (-25.5, -2, -2),
        (-30, -2, -2),
        (25.5, -2, -2),
        (30, -2, -2),
        (-21.05, -3, -38),
        (-26, -3, -31.75),
        (-2.64, -3, -38),
    ]]
    fillet(f11_edges, radius=F11_R)

    # F13
    f13_edges = [f1.edges().sort_by_distance(p)[0] for p in [
        (25.5, -2, 45.5),
        (-25.5, -2, 45.5),
        (-30, -2, -42),
        (30, -2, -42),
    ]]
    fillet(f13_edges, radius=F13_R)


solid = f1.part
